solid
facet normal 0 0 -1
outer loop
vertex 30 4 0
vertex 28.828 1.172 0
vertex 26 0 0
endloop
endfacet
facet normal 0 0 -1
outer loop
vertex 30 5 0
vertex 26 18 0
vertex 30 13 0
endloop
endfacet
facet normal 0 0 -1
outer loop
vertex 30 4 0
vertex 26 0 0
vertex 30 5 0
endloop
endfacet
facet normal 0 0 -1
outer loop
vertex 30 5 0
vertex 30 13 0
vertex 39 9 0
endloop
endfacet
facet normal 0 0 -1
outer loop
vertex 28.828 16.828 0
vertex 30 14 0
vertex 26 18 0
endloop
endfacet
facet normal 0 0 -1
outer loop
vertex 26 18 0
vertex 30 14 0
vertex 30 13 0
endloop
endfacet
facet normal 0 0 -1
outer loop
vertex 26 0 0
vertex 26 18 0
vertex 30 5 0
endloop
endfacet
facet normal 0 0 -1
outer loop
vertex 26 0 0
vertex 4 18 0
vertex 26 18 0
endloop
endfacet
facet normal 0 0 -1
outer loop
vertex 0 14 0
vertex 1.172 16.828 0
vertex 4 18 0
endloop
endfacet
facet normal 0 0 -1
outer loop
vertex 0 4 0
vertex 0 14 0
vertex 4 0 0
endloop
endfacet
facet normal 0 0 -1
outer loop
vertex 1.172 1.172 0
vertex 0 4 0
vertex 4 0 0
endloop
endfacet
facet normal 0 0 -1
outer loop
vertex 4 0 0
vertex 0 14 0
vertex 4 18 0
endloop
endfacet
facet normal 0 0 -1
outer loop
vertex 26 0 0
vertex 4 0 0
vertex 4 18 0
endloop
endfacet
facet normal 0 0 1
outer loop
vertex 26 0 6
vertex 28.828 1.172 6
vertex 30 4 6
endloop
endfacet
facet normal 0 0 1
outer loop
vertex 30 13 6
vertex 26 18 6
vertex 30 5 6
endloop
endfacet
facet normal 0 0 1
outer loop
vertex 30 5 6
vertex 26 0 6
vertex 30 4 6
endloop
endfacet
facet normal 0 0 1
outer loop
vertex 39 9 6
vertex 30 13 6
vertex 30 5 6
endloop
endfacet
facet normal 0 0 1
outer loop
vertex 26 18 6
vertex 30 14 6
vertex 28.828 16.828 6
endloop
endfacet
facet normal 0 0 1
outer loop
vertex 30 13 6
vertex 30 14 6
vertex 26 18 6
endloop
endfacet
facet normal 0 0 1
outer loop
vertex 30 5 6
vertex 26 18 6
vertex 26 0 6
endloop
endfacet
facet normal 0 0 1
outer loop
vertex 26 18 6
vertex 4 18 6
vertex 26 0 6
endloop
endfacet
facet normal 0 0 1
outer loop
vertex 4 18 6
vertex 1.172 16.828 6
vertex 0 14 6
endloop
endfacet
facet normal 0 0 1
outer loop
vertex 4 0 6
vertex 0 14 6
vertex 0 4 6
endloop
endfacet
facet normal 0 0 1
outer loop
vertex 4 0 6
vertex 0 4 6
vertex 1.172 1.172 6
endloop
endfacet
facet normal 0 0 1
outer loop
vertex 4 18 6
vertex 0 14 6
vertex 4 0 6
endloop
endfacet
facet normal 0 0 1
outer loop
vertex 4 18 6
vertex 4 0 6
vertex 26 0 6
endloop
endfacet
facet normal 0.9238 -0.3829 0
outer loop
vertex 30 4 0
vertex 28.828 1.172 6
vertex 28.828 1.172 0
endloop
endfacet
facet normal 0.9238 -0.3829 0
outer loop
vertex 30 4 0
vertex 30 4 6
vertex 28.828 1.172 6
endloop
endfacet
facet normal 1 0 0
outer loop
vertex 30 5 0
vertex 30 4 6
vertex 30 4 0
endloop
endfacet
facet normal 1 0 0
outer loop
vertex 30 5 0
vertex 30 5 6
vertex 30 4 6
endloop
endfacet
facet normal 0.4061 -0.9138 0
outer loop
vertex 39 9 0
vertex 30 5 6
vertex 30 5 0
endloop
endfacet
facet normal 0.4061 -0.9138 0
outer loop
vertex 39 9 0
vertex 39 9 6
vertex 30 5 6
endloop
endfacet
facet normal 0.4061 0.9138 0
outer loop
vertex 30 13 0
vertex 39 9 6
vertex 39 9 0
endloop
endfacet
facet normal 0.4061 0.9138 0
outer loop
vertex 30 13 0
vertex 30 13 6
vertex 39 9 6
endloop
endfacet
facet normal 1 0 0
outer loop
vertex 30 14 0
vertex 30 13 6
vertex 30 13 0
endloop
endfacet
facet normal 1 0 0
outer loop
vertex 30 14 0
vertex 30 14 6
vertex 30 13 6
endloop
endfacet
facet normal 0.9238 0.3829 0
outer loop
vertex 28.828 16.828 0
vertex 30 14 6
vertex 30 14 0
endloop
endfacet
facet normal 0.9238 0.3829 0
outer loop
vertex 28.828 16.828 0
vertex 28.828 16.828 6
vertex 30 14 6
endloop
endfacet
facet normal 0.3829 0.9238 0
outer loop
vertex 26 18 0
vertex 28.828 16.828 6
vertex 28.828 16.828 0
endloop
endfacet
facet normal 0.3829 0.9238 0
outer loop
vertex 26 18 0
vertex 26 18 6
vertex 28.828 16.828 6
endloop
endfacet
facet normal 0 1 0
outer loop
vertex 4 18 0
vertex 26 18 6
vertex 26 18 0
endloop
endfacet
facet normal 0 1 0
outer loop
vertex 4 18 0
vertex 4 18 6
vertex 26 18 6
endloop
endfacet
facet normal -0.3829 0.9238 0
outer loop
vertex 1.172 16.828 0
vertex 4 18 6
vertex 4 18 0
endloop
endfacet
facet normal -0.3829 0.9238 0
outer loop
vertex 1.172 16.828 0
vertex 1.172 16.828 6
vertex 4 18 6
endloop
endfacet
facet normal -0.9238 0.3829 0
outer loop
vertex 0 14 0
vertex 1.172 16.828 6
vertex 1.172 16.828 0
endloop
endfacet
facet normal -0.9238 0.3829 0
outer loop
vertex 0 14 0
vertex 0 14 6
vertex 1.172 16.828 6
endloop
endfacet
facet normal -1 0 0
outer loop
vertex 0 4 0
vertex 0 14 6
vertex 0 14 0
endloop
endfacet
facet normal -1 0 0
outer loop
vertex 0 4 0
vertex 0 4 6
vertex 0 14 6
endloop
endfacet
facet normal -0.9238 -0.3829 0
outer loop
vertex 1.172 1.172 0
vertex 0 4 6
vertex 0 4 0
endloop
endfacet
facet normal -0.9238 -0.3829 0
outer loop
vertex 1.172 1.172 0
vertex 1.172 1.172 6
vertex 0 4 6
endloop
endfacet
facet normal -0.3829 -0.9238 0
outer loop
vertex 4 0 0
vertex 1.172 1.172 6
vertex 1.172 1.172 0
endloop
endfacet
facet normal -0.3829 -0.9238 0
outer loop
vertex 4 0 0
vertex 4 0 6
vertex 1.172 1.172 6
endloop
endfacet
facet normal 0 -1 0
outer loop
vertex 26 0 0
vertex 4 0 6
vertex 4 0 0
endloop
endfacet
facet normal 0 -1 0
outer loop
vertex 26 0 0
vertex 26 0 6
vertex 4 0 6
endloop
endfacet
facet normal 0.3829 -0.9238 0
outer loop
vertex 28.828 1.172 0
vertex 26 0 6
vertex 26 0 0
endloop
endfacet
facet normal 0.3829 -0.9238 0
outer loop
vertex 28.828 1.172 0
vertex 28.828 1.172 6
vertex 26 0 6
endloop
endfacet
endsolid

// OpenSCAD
$fn = 32;

// ----------------------------------------------------------------------
// Ratchet pawl: 30 x 18 mm body, beak 9 mm с правого торца
// ----------------------------------------------------------------------

// --- parameters (mm) ---
profile_height = 6;       // extrusion height
profile_points = 15;      // points of the closed outline

profile = [[0, 4], [1.172, 1.172], [4, 0], [26, 0], [28.828, 1.172], [30, 4], [30, 5], [39, 9], [30, 13], [30, 14], [28.828, 16.828], [26, 18], [4, 18], [1.172, 16.828], [0, 14]];  // single closed polygon, 15 points, counter clockwise

// --- the one profile operation ---
linear_extrude(height = profile_height) polygon(points = profile);
